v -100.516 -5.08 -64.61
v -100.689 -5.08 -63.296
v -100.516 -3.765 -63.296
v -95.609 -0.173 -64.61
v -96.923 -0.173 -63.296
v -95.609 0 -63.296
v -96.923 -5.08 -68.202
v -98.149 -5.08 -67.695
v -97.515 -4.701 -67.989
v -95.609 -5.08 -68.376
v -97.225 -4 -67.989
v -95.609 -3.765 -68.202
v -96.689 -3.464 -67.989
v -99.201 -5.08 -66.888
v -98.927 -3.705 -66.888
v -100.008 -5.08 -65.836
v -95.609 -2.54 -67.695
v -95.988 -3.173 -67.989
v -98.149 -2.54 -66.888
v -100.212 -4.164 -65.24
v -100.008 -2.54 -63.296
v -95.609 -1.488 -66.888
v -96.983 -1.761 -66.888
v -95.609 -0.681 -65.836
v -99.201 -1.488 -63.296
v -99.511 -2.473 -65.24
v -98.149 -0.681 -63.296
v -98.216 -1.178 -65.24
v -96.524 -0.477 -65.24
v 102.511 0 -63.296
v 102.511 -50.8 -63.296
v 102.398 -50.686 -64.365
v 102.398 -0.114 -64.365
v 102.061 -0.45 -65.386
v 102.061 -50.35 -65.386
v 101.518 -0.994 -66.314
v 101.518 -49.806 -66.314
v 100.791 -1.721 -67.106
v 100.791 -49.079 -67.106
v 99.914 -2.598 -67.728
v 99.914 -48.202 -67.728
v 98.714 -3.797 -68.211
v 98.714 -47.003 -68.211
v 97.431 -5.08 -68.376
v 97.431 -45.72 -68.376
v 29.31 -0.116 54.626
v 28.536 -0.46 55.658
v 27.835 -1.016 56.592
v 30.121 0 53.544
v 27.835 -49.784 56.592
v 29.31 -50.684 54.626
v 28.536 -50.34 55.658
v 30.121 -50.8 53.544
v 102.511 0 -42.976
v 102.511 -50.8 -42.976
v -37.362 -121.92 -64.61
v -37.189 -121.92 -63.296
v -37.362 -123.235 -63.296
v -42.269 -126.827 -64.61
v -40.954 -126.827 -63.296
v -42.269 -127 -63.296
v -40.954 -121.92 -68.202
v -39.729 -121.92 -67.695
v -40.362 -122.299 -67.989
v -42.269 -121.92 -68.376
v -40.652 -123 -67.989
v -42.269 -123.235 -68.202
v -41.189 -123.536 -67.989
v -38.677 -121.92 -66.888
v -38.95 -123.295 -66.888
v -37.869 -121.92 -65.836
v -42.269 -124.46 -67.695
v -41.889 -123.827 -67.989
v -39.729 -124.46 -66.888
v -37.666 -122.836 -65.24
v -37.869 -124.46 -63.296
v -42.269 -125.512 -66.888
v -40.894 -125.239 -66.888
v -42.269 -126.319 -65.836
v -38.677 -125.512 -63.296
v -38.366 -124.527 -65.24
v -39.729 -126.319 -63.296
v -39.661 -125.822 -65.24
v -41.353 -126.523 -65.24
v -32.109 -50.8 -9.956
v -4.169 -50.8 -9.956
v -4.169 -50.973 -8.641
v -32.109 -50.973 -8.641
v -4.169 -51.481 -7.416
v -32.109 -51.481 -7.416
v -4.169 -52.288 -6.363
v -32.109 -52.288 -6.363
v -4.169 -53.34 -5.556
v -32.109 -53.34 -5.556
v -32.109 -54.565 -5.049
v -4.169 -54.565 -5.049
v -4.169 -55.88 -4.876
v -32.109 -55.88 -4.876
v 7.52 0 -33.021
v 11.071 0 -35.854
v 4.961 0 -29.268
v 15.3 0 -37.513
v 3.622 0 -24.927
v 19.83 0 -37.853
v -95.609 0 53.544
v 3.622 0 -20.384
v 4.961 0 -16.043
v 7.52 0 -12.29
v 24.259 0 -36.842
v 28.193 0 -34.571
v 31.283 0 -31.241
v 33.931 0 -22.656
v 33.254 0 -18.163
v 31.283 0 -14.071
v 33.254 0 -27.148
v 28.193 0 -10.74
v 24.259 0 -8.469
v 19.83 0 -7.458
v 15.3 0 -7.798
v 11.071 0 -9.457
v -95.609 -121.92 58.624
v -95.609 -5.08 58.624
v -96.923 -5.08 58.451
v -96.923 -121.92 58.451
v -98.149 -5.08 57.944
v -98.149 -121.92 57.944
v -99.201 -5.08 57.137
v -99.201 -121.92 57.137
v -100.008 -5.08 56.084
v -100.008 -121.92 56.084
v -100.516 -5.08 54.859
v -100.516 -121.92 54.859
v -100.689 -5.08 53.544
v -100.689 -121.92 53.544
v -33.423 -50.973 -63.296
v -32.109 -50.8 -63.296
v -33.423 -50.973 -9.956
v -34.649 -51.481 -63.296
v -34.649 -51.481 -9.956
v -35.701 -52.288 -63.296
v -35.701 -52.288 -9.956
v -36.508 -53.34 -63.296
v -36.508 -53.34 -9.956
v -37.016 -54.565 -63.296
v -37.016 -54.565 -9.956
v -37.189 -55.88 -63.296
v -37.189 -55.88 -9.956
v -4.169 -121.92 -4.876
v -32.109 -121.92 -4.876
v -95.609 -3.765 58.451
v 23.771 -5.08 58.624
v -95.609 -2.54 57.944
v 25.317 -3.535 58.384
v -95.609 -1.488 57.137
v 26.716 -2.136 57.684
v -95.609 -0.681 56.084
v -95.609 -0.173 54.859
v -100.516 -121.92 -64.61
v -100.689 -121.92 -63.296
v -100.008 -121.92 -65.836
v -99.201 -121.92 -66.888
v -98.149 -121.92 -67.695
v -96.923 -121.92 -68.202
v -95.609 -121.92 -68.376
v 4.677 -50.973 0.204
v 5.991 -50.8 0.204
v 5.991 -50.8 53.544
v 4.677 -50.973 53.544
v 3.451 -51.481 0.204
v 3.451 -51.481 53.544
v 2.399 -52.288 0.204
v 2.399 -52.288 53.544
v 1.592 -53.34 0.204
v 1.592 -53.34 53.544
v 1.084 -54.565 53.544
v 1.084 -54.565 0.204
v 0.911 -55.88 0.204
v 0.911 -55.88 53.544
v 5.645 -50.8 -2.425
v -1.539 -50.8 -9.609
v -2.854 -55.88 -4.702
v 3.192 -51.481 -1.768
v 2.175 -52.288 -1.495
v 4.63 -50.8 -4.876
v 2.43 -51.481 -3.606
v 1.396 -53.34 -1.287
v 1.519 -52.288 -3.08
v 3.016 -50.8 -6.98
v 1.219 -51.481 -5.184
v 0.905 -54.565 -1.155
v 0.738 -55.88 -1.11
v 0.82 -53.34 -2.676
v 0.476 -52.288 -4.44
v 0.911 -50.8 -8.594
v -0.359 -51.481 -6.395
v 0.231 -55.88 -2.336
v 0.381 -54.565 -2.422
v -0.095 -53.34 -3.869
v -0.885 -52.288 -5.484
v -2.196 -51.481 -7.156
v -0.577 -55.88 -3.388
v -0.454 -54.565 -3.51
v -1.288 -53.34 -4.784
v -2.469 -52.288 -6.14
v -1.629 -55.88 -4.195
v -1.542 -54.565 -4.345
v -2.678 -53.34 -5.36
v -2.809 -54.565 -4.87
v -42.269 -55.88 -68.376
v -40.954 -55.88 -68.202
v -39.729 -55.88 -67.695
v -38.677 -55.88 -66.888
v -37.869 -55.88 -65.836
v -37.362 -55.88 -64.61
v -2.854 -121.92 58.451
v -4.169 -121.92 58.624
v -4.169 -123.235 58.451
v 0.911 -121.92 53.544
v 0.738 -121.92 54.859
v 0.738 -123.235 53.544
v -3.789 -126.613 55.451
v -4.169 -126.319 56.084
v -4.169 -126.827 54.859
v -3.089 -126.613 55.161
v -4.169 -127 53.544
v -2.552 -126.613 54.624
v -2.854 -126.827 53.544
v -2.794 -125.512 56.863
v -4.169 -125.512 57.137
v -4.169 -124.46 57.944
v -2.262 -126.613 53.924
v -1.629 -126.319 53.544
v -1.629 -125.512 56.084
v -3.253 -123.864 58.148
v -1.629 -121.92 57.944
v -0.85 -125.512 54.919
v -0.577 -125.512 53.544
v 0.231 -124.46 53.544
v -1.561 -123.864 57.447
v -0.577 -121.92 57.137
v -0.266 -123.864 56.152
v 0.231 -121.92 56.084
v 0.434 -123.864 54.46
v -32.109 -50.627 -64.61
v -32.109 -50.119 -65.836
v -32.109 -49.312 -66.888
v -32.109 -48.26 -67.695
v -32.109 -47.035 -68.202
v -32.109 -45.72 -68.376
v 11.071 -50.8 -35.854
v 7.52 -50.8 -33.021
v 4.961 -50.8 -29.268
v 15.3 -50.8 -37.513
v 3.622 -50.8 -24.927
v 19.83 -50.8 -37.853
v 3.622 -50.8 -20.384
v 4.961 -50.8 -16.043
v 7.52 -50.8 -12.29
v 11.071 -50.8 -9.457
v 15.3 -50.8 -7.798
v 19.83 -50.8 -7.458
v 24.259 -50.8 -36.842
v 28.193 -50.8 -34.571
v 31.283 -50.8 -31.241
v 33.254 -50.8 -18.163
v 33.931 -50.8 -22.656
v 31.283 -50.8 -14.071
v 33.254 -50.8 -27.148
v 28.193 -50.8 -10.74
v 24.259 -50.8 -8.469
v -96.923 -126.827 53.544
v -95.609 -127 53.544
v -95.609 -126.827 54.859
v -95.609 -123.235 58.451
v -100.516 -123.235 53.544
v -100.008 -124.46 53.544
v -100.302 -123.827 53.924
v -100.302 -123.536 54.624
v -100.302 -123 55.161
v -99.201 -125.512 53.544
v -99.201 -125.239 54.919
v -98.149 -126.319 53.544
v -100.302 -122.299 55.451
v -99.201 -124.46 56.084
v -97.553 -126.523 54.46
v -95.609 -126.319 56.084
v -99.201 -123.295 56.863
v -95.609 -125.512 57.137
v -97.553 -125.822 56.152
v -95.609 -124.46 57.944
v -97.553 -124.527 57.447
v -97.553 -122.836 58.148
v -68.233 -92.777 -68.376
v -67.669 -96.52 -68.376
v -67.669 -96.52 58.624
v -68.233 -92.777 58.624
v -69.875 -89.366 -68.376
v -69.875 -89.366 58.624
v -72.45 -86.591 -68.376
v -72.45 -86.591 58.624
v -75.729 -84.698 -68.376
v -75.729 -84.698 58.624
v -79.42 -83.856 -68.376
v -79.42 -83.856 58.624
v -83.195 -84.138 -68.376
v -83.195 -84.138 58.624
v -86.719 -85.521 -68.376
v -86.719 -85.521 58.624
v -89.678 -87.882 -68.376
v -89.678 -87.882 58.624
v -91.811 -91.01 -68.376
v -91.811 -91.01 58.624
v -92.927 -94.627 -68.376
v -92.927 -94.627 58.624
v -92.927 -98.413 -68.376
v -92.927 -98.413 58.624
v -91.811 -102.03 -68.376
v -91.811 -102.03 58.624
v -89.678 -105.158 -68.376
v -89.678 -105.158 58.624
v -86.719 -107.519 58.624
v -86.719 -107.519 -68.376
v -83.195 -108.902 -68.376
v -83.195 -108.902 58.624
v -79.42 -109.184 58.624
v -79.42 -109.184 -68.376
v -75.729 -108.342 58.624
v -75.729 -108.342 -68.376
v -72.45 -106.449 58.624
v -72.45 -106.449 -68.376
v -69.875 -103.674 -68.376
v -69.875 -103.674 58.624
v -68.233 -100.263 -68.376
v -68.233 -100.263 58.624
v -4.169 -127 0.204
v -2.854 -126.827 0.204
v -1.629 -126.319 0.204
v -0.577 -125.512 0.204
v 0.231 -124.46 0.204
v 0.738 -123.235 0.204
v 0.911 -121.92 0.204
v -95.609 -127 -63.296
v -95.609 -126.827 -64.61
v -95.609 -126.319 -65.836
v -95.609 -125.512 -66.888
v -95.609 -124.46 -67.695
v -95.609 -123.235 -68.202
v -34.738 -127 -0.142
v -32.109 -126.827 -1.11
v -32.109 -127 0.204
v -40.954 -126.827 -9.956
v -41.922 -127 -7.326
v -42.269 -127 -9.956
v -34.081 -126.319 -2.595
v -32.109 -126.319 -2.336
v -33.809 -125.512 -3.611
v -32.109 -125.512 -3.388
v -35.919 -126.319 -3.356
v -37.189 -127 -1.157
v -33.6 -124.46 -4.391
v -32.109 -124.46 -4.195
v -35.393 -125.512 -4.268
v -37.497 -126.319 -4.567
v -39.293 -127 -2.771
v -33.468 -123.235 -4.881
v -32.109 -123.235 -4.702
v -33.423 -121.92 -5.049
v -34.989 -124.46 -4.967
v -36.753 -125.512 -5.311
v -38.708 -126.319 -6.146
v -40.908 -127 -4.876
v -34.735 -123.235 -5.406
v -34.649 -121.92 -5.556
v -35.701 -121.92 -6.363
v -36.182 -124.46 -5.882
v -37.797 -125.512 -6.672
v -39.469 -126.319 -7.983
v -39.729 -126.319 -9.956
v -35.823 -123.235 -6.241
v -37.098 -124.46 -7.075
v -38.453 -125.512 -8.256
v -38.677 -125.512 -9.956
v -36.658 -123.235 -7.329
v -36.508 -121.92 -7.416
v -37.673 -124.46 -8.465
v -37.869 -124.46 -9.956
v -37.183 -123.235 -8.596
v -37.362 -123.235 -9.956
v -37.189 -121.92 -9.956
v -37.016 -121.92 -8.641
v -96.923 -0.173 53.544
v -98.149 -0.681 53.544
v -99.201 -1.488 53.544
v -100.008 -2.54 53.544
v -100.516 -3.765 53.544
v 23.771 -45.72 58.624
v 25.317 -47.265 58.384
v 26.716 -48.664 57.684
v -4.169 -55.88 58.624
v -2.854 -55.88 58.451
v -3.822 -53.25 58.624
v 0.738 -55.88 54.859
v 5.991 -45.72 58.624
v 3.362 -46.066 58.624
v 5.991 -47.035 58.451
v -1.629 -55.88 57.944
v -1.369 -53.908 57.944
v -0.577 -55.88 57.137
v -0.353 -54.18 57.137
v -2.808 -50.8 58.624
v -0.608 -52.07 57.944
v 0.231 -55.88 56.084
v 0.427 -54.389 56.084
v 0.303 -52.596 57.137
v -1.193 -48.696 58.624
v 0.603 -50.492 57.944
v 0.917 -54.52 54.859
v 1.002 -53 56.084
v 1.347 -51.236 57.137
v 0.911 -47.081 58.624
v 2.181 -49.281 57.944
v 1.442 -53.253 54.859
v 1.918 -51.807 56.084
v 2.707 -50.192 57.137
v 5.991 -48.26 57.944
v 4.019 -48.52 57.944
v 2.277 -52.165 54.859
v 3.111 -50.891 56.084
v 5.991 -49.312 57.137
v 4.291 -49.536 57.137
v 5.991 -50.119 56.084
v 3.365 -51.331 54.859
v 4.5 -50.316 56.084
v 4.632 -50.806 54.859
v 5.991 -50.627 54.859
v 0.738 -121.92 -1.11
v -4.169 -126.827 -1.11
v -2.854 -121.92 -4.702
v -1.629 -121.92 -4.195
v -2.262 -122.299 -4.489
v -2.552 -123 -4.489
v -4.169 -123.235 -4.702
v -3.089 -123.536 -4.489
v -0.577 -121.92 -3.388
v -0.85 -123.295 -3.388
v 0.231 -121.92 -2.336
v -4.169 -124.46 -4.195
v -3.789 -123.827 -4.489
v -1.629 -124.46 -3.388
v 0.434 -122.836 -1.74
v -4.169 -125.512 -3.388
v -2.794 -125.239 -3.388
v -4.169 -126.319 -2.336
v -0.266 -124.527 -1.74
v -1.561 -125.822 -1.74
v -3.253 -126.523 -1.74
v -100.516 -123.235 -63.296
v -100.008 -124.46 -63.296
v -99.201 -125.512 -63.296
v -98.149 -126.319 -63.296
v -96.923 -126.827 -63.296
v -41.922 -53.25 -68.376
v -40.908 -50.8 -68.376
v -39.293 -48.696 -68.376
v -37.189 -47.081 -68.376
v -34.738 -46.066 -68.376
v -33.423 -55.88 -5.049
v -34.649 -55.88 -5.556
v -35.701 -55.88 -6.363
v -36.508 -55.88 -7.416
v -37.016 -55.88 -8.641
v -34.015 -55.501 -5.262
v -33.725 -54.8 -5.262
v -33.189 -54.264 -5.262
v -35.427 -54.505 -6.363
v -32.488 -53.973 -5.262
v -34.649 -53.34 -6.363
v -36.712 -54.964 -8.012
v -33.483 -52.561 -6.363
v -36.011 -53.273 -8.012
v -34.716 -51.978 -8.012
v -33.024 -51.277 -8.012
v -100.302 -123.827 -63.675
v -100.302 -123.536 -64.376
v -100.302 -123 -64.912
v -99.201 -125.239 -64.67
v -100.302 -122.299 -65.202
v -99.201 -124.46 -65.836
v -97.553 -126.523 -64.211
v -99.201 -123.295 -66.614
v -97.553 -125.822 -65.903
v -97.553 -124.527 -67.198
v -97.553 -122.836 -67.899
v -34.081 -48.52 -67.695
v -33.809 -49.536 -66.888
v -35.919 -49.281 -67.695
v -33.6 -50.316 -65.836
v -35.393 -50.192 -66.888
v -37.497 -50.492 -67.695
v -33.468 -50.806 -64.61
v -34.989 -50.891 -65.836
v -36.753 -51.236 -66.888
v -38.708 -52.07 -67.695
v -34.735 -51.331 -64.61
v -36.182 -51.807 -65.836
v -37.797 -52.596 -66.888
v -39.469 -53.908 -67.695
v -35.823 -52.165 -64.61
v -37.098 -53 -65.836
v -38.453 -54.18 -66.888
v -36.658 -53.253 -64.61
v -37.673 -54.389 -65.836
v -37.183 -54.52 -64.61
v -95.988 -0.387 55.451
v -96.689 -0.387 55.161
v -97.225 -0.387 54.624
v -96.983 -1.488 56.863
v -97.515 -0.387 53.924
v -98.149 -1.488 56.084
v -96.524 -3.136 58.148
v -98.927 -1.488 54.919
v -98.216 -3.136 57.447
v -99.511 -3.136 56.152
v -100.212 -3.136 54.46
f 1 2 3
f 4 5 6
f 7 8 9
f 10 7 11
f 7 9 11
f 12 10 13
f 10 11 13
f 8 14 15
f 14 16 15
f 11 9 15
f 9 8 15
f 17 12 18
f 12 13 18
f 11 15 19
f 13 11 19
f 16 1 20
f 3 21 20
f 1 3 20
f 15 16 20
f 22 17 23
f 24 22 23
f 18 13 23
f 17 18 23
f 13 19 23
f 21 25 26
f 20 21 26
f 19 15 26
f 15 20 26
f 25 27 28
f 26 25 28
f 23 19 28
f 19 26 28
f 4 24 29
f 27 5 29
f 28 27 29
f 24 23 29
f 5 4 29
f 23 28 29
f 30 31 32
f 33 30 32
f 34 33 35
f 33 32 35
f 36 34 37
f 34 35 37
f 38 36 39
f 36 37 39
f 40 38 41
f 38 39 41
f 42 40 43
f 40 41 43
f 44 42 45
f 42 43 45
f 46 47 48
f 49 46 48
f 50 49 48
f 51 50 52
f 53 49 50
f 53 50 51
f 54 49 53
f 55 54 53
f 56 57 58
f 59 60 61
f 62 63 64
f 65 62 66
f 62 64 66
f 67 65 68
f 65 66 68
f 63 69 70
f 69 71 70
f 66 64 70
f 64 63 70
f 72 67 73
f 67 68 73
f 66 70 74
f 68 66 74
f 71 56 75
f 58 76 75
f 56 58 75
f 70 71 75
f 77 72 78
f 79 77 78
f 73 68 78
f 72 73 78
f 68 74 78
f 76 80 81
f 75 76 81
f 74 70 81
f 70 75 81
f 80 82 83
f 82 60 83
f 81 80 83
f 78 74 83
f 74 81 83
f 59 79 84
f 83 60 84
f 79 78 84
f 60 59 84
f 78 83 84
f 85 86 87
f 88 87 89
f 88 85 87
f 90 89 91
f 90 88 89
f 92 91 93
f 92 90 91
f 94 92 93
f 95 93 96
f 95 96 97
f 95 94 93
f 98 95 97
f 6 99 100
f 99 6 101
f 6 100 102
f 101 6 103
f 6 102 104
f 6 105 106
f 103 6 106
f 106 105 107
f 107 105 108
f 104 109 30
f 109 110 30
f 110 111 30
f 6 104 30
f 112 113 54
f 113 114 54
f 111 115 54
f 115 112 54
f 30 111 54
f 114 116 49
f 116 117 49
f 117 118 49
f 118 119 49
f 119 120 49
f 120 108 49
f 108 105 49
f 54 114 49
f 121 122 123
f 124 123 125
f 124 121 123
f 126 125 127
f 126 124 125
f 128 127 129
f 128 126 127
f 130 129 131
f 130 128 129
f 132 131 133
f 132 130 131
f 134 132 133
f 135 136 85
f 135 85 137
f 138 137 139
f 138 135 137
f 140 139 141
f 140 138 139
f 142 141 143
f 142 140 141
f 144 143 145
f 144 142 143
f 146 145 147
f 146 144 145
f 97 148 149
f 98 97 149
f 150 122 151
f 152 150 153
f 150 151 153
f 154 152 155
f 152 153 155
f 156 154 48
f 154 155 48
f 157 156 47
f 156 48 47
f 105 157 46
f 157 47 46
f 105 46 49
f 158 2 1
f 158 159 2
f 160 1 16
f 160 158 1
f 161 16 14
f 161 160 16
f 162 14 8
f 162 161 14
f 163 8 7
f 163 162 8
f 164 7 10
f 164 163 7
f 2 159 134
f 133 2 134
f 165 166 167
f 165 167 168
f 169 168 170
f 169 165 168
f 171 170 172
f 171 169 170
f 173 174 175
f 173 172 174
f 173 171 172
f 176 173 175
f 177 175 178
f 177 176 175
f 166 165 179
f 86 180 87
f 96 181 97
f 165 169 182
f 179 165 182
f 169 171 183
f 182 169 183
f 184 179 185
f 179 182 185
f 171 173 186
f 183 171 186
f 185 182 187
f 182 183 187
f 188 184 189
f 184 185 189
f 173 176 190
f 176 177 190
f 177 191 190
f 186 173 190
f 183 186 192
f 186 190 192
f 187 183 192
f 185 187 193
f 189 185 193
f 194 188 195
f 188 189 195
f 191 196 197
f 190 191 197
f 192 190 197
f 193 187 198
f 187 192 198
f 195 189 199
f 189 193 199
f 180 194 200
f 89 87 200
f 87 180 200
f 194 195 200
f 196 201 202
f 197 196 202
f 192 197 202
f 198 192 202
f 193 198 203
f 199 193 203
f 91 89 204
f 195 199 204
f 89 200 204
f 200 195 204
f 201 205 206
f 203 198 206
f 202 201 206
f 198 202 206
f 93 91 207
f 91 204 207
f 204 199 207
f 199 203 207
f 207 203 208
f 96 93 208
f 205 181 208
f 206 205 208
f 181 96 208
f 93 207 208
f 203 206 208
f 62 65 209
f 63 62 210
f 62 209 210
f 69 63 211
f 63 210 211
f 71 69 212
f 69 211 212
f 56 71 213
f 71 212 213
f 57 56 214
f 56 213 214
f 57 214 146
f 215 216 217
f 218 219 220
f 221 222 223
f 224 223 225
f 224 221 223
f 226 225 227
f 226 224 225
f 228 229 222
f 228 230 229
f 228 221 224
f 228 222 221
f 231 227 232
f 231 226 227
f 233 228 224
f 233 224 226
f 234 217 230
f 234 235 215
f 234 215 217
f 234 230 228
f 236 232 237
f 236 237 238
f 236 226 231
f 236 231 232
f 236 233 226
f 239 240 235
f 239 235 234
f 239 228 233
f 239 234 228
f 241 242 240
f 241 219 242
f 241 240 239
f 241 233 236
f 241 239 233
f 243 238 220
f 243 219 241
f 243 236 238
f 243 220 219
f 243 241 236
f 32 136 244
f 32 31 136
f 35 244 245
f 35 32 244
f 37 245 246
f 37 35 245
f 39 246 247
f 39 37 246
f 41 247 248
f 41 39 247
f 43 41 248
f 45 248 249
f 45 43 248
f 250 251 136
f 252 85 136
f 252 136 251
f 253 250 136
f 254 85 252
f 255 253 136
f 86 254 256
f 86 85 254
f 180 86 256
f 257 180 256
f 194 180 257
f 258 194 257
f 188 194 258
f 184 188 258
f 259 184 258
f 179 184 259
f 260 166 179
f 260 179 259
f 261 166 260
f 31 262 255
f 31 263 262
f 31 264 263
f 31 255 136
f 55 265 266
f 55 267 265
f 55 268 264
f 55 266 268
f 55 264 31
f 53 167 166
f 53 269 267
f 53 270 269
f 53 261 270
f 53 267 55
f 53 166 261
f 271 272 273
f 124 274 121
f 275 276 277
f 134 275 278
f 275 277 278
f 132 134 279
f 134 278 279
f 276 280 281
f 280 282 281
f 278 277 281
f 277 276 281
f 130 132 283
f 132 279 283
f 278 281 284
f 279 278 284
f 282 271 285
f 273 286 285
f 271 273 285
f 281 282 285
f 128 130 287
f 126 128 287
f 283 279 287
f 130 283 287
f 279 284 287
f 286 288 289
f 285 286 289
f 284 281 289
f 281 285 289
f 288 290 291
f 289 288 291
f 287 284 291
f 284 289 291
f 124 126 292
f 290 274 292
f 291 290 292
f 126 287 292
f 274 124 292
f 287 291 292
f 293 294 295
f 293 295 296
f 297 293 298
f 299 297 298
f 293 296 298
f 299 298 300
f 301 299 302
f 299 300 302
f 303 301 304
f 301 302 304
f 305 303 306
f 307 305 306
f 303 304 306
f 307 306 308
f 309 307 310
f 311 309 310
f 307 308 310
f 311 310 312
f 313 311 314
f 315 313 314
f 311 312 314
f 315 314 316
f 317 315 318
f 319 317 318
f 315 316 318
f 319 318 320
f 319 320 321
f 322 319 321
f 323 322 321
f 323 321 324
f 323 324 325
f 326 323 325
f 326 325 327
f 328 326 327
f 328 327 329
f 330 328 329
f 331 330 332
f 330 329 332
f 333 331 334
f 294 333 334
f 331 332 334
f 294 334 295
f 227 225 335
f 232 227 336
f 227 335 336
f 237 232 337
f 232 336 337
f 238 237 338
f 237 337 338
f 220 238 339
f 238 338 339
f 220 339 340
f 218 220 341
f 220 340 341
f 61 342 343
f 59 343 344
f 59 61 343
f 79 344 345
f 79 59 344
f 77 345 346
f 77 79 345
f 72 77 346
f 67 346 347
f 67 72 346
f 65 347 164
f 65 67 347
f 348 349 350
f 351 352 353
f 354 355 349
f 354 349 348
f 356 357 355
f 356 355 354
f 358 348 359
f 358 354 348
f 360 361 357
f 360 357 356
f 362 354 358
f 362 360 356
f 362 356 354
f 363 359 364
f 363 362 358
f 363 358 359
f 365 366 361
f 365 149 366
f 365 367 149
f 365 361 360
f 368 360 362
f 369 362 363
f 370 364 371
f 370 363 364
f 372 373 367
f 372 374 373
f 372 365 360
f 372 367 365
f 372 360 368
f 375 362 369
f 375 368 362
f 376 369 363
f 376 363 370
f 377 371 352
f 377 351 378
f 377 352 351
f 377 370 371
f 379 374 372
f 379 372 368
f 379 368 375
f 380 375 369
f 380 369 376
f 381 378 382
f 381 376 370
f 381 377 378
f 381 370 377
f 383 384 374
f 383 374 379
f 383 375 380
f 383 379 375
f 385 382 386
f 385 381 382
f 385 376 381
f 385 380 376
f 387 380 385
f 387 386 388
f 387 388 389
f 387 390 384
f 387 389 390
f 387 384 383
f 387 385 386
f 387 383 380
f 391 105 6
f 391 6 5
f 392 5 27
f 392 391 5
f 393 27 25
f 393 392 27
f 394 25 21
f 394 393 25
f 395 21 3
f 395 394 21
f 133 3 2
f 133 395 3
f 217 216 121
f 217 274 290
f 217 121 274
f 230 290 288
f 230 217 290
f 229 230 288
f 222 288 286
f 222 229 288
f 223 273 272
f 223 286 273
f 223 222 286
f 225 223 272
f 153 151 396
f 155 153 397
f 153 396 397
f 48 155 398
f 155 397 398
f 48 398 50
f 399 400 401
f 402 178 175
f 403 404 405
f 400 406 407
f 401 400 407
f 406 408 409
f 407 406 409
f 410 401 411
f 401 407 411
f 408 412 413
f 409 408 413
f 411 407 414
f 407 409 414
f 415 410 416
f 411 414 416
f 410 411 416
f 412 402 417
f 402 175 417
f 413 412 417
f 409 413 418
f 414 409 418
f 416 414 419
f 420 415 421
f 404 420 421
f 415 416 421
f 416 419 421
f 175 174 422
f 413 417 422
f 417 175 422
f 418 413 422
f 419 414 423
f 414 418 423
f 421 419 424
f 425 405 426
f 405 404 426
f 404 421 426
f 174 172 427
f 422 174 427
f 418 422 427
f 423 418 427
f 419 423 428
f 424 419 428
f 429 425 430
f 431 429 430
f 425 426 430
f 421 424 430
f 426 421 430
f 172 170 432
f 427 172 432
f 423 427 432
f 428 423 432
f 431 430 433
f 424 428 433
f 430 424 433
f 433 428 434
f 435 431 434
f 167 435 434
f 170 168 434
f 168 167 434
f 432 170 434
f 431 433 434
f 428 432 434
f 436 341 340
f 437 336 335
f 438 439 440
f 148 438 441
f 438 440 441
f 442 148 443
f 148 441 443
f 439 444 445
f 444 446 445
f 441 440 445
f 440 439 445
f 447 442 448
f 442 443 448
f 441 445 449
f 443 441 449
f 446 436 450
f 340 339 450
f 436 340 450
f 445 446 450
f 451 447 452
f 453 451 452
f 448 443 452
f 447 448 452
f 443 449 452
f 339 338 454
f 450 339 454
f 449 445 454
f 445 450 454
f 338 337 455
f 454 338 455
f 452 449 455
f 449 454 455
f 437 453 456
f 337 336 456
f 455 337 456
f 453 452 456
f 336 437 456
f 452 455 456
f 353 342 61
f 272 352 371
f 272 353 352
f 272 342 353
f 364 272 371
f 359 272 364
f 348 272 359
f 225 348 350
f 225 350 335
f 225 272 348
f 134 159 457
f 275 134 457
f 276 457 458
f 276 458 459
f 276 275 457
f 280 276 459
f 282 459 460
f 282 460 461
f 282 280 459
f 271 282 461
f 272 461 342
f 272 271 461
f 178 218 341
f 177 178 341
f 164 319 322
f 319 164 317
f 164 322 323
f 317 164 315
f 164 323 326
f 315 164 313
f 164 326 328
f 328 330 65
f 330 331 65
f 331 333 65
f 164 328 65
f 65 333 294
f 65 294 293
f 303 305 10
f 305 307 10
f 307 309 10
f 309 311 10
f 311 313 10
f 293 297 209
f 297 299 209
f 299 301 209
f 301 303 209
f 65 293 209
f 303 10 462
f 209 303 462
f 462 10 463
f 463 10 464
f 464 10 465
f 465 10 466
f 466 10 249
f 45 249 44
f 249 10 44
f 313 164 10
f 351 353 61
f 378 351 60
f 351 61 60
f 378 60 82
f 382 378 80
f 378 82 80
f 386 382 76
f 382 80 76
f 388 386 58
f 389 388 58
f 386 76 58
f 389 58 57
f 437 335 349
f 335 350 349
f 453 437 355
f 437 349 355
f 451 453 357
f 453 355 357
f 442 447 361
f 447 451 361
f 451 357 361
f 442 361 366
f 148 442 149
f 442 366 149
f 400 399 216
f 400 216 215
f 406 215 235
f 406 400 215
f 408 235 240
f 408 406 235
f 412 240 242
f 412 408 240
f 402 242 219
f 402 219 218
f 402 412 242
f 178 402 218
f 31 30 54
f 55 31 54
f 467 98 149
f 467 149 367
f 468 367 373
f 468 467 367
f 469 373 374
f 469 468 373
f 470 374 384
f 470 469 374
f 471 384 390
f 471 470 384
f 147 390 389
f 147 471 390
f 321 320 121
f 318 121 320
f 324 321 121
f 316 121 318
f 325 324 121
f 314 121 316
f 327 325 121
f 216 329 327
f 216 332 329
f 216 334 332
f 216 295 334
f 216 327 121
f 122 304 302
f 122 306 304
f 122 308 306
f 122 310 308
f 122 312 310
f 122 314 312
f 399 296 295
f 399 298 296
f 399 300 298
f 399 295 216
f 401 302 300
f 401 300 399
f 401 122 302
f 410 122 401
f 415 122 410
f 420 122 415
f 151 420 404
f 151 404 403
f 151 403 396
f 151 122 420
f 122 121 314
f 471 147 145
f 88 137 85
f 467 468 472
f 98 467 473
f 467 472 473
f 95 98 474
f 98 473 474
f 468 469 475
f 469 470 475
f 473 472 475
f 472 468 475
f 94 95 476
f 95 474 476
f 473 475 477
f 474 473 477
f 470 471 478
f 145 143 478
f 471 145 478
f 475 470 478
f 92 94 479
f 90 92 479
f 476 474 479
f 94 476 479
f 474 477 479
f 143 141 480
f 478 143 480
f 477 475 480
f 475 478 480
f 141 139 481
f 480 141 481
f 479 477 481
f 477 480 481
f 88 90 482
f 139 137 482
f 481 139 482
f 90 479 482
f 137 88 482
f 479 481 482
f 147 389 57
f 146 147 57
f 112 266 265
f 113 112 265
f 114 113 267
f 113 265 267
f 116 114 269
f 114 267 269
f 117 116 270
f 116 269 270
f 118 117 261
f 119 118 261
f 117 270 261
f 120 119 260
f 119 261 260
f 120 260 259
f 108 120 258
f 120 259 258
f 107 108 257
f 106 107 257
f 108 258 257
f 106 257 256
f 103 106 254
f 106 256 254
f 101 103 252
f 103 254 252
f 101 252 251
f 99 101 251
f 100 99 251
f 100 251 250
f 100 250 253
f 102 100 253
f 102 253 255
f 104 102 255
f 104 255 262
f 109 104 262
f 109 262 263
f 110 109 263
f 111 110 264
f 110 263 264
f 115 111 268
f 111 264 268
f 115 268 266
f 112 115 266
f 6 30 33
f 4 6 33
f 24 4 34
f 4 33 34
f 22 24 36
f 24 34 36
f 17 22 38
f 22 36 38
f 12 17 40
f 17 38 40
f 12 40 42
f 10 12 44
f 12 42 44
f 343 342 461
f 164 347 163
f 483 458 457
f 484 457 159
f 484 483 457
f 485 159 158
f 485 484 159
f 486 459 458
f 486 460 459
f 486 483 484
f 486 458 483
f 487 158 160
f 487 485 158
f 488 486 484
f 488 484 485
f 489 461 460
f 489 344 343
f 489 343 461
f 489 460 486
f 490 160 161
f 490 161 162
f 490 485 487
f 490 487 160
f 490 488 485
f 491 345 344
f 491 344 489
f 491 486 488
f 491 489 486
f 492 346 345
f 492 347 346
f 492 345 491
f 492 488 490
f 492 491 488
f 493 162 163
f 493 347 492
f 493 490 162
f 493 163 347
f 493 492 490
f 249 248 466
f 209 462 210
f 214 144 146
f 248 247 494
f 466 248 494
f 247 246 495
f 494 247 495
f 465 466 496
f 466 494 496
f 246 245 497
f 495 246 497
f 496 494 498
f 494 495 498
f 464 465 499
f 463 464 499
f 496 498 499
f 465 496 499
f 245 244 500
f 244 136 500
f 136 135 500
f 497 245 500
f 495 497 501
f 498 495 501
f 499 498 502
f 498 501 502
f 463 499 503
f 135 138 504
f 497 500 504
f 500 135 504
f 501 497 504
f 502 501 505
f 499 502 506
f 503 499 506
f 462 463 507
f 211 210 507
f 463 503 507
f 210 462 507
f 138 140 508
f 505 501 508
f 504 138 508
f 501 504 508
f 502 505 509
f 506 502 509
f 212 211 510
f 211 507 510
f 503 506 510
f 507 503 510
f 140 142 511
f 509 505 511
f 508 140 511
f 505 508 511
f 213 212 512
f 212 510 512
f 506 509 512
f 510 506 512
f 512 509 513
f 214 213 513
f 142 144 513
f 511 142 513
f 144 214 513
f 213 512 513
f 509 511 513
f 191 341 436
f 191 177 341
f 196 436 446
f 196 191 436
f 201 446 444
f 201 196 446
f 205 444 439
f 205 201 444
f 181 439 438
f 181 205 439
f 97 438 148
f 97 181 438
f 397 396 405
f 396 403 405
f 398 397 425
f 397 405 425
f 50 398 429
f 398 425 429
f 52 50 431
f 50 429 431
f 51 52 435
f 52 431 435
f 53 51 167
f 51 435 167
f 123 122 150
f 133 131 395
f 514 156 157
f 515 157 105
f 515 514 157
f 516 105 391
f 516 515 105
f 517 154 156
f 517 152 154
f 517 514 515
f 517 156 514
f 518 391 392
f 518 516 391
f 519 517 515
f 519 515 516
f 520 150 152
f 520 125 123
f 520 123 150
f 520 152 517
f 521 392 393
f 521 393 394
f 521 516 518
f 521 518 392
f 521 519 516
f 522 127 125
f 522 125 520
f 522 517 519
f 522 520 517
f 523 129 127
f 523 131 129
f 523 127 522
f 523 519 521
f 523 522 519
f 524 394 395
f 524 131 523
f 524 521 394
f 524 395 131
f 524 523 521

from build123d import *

# Parameters (mm, degrees)
F0_W     = 203.2
F0_H     = 127
F1_DEPTH = 127
F3_DEPTH = 76.2
F4_SIZE2 = 101.6
F4_SIZE  = 76.2
F5_R     = 5.08
F6_R     = 15.24
F7_DEPTH = 50.8
F8_R     = 12.7
F9_DEPTH = 127


with BuildPart() as f1:
    # F0 (on Front) → F1 (new body)
    with BuildSketch(Plane.XZ):
        with Locations((0.9113103151, -4.8755629536)):
            Rectangle(F0_W, F0_H)
    extrude(amount=F1_DEPTH)

    # F2 (on face) → F3 (cut)
    with BuildSketch(Plane.XZ.offset(127)):
        Polygon((102.5113103151, 58.6244370464), (0.9113103151, 58.6244370464), (0.9113103151, -4.8755629536), (-37.1886896849, -4.8755629536), (-37.1886896849, -68.3755629536), (102.5113103151, -68.3755629536), align=None)
    extrude(amount=-F3_DEPTH, mode=Mode.SUBTRACT)

    # F4
    f4_edges = [f1.edges().sort_by_distance(p)[0] for p in [
        (102.51131, -25.4, 58.624437),
    ]]
    f4_side = f1.faces().sort_by_distance((-20.860118, -52.614286, 58.624437))[0]
    chamfer(f4_edges, length=F4_SIZE, length2=F4_SIZE2, reference=f4_side)

    # F5
    f5_edges = [f1.edges().sort_by_distance(p)[0] for p in [
        (0.91131, -88.9, 58.624437),
        (26.31131, -25.4, 58.624437),
        (13.61131, -50.8, 58.624437),
        (-49.88869, -127, 58.624437),
        (0.91131, -127, 26.874437),
        (0.91131, -88.9, -4.875563),
        (-18.13869, -127, -4.875563),
        (-37.18869, -127, -36.625563),
        (32.66131, -50.8, -68.375563),
        (-37.18869, -88.9, -68.375563),
        (-68.93869, -127, -68.375563),
        (-100.68869, -127, -4.875563),
        (-100.68869, -63.5, 58.624437),
        (-37.18869, 0, 58.624437),
        (102.51131, -25.4, -68.375563),
        (-100.68869, 0, -4.875563),
        (-100.68869, -63.5, -68.375563),
        (0.91131, 0, -68.375563),
        (0.91131, -50.8, 26.874437),
        (-37.18869, -50.8, -36.625563),
        (-37.18869, -88.9, -4.875563),
        (-18.13869, -50.8, -4.875563),
    ]]
    fillet(f5_edges, radius=F5_R)

    # F6 (on face) → F7 (cut, through all)
    with BuildSketch(Plane.XZ.offset(50.8)):
        with Locations((18.6913103151, -22.6555629536)):
            Circle(F6_R)
    extrude(amount=-F7_DEPTH, mode=Mode.SUBTRACT)

    # F8 (on face) → F9 (cut, through all)
    with BuildSketch(Plane.XY.offset(58.6244370464)):
        with Locations((-80.3686896849, -96.52)):
            Circle(F8_R)
    extrude(amount=-F9_DEPTH, mode=Mode.SUBTRACT)


solid = f1.part
